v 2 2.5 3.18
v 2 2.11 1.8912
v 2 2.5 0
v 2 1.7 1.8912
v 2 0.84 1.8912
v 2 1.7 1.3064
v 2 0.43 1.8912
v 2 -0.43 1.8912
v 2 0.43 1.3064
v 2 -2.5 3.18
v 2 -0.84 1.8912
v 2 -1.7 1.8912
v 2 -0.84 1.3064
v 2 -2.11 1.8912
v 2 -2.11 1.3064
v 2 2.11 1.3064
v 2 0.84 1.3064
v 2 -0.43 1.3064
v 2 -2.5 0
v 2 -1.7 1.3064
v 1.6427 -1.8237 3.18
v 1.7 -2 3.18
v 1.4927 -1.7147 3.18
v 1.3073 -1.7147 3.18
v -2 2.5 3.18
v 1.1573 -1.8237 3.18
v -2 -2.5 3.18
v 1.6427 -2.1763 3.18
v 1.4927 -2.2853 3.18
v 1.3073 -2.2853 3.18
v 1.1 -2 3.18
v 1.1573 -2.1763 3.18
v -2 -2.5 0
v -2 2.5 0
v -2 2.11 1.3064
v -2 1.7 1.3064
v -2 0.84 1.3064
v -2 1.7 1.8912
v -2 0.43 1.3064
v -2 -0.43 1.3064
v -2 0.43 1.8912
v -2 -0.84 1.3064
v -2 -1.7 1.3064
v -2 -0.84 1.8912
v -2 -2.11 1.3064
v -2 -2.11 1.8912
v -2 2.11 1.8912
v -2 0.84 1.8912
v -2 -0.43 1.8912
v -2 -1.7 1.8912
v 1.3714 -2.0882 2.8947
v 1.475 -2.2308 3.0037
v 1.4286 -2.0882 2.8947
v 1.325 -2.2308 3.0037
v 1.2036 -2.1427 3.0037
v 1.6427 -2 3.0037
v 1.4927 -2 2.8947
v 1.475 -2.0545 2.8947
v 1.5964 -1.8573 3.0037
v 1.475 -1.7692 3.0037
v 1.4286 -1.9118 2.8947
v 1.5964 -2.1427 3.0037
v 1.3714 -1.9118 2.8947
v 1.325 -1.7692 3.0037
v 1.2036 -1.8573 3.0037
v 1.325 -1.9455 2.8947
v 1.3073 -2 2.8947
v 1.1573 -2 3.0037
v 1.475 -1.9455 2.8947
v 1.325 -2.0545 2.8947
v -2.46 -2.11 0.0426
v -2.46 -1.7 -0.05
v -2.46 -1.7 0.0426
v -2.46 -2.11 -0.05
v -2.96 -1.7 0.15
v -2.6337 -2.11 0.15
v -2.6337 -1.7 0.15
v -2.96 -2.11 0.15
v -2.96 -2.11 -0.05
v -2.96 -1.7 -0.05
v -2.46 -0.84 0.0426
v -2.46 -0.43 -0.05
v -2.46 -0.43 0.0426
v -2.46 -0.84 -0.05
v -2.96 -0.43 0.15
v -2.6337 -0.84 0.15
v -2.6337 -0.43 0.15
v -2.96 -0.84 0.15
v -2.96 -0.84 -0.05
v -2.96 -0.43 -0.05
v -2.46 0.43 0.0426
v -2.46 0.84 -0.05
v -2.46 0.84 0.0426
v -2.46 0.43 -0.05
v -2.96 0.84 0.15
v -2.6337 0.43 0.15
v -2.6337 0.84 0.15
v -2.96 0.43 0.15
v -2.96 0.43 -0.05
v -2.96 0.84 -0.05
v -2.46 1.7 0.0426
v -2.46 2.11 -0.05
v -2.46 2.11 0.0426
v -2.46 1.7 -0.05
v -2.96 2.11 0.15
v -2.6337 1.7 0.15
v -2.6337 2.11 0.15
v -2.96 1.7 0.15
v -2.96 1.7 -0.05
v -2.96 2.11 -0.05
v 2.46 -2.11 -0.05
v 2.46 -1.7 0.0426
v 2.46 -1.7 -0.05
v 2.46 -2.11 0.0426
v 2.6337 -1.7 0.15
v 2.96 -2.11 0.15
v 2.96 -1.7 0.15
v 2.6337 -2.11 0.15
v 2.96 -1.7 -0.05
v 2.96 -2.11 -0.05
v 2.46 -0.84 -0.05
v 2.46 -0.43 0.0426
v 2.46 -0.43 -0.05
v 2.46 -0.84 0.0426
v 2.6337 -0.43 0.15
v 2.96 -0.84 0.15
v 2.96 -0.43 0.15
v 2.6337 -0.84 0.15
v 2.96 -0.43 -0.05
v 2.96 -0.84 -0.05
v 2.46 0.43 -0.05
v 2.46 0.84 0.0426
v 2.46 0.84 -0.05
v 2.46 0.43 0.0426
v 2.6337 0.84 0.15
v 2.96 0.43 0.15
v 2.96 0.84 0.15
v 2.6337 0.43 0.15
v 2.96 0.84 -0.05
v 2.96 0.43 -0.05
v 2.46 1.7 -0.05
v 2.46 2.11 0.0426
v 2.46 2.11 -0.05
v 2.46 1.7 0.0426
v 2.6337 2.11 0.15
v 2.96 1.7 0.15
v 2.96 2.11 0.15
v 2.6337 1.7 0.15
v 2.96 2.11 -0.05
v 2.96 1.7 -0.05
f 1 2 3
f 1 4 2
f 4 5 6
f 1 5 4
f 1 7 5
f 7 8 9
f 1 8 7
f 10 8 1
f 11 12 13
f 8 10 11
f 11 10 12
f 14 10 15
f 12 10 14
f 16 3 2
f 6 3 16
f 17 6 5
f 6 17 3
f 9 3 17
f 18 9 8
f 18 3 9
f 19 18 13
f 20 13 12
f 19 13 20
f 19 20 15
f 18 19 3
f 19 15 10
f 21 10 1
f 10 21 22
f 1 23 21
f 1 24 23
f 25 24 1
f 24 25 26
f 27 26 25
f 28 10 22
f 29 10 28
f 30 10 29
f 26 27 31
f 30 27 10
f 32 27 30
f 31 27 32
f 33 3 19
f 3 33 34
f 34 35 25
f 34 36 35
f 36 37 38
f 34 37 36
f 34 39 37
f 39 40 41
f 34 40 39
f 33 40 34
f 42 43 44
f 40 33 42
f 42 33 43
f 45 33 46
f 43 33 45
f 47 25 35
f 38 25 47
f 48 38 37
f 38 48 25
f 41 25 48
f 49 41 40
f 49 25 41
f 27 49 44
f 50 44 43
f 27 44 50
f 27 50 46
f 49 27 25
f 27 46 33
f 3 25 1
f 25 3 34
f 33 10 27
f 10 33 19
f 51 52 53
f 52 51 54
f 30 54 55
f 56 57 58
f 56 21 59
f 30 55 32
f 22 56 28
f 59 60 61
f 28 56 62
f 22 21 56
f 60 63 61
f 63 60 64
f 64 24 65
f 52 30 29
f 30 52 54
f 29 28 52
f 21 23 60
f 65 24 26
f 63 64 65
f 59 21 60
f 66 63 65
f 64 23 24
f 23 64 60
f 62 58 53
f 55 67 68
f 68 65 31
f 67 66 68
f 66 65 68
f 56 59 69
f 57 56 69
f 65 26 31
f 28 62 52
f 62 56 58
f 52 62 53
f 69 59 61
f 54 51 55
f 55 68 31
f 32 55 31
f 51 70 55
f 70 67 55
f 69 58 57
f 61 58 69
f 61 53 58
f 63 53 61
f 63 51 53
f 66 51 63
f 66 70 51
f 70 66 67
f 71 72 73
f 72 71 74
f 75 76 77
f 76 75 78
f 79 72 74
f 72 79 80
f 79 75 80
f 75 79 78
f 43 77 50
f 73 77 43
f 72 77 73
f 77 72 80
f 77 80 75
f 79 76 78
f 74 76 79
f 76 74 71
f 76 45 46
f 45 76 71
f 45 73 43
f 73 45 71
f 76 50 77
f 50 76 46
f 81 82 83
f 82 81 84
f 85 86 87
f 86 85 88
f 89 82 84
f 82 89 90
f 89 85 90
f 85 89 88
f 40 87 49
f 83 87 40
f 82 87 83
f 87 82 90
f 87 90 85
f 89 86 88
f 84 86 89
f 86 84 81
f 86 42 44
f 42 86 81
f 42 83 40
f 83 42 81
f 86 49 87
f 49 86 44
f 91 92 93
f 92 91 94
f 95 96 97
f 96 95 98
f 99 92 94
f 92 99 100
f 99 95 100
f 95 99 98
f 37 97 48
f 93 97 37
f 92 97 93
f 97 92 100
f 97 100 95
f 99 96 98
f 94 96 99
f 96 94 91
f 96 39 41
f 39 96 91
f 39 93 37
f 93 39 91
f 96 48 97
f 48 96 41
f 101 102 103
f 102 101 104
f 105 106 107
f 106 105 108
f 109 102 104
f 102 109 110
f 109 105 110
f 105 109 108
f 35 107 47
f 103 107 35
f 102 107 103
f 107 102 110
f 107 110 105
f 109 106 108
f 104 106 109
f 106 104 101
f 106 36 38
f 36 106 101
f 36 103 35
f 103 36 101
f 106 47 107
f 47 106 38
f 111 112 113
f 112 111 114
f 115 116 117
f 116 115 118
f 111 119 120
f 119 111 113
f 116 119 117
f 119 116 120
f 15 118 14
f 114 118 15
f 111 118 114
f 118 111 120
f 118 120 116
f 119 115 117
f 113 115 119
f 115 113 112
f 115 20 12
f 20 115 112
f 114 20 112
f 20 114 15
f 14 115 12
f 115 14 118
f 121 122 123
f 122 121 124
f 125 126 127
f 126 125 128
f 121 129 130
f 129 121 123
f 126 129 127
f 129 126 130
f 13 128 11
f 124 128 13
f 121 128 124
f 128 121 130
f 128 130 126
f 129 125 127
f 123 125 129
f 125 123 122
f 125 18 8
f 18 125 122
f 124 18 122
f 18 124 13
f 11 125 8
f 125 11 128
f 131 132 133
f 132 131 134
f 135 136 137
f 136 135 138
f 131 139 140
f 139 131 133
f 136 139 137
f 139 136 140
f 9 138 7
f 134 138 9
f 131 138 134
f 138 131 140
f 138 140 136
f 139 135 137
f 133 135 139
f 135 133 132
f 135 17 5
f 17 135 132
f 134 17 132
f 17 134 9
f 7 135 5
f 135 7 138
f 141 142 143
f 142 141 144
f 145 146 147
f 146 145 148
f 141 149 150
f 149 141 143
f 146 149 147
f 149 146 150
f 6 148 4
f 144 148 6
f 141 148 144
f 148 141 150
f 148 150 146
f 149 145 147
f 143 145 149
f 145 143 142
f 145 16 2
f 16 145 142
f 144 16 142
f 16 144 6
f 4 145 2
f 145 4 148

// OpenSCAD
/*
 * A generic SOIC 4mm wide, 5.0mm long, 1.27mm pitch packaged part.
 *
 * Author: Ian McInerney
 * Created: July 16, 2015
 *
 */

module pin() {
	translate([0,0.0,0.0])cube([0.5,0.41,0.20], center=true);
	translate([0.23,0.0,0.23])rotate([0.0,20,0.0])translate([0.0,0.0,0.7])cube([0.2,0.41,2.0], center=true);
}


// Assemble the main package and the pins
module main() {
		translate([0.0,0.0,3.18/2])cube([4.0,5.0,3.18], center=true);
}

// Add the marker for pin 1
difference() {
	// The main cube
	main();

	// The pin 1 marker
	translate([1.4,-2.0,3.18])sphere(r=0.3, $fn=10);
}

translate([-2.71,-1.905,0.05])pin();
translate([-2.71,-0.635,0.05])pin();
translate([-2.71,0.635,0.05])pin();
translate([-2.71,1.905,0.05])pin();

translate([2.71,-1.905,0.05])rotate([0.0,0.0,180])pin();
translate([2.71,-0.635,0.05])rotate([0.0,0.0,180])pin();
translate([2.71,0.635,0.05])rotate([0.0,0.0,180])pin();
translate([2.71,1.905,0.05])rotate([0.0,0.0,180])pin();
